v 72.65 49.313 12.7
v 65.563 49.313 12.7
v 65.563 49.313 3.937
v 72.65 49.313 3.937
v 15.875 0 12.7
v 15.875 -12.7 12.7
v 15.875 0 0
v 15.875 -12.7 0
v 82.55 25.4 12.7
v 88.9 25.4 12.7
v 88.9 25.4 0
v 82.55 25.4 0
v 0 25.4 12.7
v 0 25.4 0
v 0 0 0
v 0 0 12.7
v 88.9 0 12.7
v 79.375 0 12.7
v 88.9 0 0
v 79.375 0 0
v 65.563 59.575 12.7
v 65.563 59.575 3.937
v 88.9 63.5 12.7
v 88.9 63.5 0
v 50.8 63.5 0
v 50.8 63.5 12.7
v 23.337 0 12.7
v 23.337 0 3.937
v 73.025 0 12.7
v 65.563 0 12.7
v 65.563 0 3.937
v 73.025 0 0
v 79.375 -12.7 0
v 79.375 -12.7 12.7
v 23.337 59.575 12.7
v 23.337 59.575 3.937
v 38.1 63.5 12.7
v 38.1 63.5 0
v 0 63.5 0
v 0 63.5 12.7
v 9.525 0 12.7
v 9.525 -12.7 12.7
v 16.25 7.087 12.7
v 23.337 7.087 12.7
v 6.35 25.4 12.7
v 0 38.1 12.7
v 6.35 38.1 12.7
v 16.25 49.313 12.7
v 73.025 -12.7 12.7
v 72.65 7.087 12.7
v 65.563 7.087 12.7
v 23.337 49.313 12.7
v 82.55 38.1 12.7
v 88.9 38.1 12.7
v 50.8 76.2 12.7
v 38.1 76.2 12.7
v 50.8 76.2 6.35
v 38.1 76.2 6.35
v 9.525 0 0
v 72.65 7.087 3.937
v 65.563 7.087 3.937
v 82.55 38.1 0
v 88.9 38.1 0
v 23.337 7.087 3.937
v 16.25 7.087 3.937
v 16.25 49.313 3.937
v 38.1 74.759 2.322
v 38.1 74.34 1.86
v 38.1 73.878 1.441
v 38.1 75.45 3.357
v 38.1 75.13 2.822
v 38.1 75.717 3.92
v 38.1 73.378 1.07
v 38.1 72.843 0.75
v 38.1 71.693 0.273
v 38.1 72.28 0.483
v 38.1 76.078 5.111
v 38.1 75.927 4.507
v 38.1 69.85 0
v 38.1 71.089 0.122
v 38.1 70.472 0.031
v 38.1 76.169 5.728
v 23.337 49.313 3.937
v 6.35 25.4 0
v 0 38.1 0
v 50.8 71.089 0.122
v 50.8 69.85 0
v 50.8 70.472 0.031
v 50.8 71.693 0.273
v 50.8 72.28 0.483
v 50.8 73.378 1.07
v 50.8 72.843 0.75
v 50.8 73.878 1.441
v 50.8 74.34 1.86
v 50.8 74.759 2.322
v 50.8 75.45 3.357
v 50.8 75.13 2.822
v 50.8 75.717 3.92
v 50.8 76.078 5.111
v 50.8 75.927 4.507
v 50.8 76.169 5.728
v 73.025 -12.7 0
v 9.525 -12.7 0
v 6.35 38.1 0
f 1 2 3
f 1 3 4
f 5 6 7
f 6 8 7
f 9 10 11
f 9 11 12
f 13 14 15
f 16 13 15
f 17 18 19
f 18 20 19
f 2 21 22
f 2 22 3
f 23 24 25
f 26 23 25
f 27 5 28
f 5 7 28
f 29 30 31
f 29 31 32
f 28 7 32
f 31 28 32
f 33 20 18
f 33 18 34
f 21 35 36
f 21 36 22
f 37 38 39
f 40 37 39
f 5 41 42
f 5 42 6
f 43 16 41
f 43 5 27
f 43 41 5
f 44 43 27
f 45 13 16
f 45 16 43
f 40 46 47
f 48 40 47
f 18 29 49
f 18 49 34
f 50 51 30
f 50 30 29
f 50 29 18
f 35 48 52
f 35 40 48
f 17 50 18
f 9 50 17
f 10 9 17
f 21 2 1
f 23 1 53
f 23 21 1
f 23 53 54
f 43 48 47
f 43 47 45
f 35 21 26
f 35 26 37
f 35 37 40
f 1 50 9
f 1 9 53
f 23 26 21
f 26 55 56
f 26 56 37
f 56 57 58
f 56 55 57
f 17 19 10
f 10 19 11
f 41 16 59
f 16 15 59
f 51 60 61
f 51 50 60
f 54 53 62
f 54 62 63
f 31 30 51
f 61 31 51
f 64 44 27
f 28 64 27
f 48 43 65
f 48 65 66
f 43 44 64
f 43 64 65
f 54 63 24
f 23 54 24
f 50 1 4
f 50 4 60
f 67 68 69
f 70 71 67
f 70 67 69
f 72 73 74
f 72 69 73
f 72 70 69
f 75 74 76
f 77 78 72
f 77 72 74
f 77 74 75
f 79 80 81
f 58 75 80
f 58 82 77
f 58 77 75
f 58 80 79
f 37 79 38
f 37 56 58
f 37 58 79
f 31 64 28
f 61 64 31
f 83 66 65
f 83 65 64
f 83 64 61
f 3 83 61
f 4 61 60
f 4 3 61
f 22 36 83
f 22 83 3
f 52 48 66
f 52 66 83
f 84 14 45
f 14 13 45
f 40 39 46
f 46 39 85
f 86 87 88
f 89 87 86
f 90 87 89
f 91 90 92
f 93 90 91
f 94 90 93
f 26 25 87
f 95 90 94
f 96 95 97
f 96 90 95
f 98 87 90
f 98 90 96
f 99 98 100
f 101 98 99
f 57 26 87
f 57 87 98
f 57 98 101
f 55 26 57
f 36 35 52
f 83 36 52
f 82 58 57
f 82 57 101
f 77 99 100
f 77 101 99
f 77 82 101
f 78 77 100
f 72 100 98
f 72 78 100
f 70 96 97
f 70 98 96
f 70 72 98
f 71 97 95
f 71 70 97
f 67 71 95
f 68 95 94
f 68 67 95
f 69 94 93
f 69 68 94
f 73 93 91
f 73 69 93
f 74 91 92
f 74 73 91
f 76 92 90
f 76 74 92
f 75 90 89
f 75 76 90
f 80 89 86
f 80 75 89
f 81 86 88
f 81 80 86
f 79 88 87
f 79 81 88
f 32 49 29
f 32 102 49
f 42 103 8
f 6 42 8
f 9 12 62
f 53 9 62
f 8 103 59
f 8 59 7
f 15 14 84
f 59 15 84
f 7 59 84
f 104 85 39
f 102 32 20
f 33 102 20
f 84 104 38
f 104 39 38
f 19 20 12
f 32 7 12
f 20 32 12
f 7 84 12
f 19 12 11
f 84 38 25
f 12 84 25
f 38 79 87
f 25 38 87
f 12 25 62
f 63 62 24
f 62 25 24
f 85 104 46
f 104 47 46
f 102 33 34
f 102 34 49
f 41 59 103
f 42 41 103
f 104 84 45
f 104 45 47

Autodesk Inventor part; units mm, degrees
ref_plane "YZ Plane" through (0, 0, 0) normal (1, 0, 0) x (0, 1, 0)
ref_plane "XZ Plane" through (0, 0, 0) normal (0, 1, 0) x (-1, 0, 0)
ref_plane "XY Plane" through (0, 0, 0) normal (0, 0, 1) x (1, 0, 0)
sketch "Sketch1" plane through (0, 0, 0) normal (0, 0, 1) x (1, 0, 0)
  line L0 (0, 0) -> (9.525, 0)
  line L1 (88.9, 0) -> (88.9, 63.5)
  line L2 (88.9, 63.5) -> (0, 63.5)
  line L3 (0, 63.5) -> (0, 0)
  line L4 (79.375, 0) -> (79.375, -12.7)
  line L5 (79.375, -12.7) -> (73.025, -12.7)
  line L6 (73.025, -12.7) -> (73.025, 0)
  line L7 (44.45, 0) -> (44.45, 63.5) construction
  line L8 (16.25, 0) -> (16.25, 56.4) construction
  line L9 (16.25, 56.4) -> (72.65, 56.4) construction
  line L10 (72.65, 56.4) -> (72.65, 0) construction
  line L11 (9.525, 0) -> (9.525, -12.7)
  line L12 (9.525, -12.7) -> (15.875, -12.7)
  line L13 (15.875, -12.7) -> (15.875, 0)
  line L14 (15.875, 0) -> (73.025, 0)
  line L15 (79.375, 0) -> (88.9, 0)
  dimension "d0" = 88.9
  dimension "d1" = 63.5
  dimension "d4" = 6.35
  dimension "d5" = 12.7
ref_plane "Work Plane1" through (0, 0, 12.7) normal (0, 0, 1) x (1, 0, 0)
sketch "Sketch2" plane through (0, 0, 12.7) normal (0, 0, 1) x (1, 0, 0)
  line L0 (23.3366, 59.575) -> (23.3366, 49.3134)
  line L1 (65.5634, 51.3062) -> (65.5634, 49.3134)
  line L2 (65.5634, 59.575) -> (65.5634, 49.3134)
  line L3 (23.3366, 49.3134) -> (23.3366, 56.4)
  line L4 (65.5634, 49.3134) -> (72.65, 49.3134)
  line L5 (72.65, 49.3134) -> (72.65, 7.0866)
  line L6 (72.65, 7.0866) -> (65.5634, 7.0866)
  line L7 (23.3366, 7.0866) -> (23.3366, 0)
  line L8 (23.3366, 0) -> (65.5634, 0)
  line L9 (65.5634, 0) -> (65.5634, 7.0866)
  line L10 (23.3366, 7.0866) -> (16.25, 7.0866)
  line L11 (16.25, 7.0866) -> (16.25, 49.3134)
  line L12 (16.25, 49.3134) -> (23.3366, 49.3134)
  line L13 (44.45, 0) -> (44.45, 56.4) construction
  line L14 (28.575, 0) -> (60.325, 0) construction
  line L15 (44.45, 0) -> (44.45, 63.5) construction
  line L16 (88.9, 63.5) -> (0, 63.5) construction
  line L17 (72.65, 0) -> (16.25, 0) construction
  line L18 (16.25, 0) -> (16.25, 56.4) construction
  line L19 (72.65, 56.4) -> (72.65, 0) construction
  line L20 (23.3366, 59.575) -> (65.5634, 59.575)
  point P0 (0, 0)
  point P1 (72.65, 56.4)
extrude "Extrusion3" add sketch "Sketch1" along normal blind 12.7
extrude "Extrusion5" cut sketch "Sketch2" against normal blind 8.763
sketch "Sketch3" plane through (0, 0, 12.7) normal (0, 0, 1) x (1, 0, 0)
  line L0 (0, 63.5) -> (0, 0) construction
  line L1 (0, 63.5) -> (0, 0) construction
  line L2 (0, 25.4) -> (6.35, 25.4)
  line L3 (6.35, 25.4) -> (6.35, 38.1)
  line L4 (6.35, 38.1) -> (0, 38.1)
  line L5 (0, 38.1) -> (0, 25.4)
  line L6 (88.9, 63.5) -> (0, 63.5) construction
  line L7 (44.45, 63.5) -> (44.45, 0) construction
  line L8 (65.5634, 0) -> (23.3366, 0) construction
  line L9 (88.9, 25.4) -> (82.55, 25.4)
  line L10 (82.55, 25.4) -> (82.55, 38.1)
  line L11 (82.55, 38.1) -> (88.9, 38.1)
  line L12 (88.9, 38.1) -> (88.9, 25.4)
  point P0 (0, 31.75)
  point P1 (88.9, 31.75)
  dimension "d19" = 12.7
extrude "Extrusion6" cut sketch "Sketch3" against normal through all
sketch "Sketch4" plane through (0, 0, 12.7) normal (0, 0, 1) x (1, 0, 0)
  line L0 (88.9, 63.5) -> (0, 63.5) construction
  line L1 (44.45, 63.5) -> (44.45, 69.85) construction
  line L2 (44.45, 63.5) -> (50.8, 63.5) construction
  line L3 (38.1, 63.5) -> (50.8, 63.5)
  line L4 (50.8, 63.5) -> (50.8, 76.2)
  line L5 (50.8, 76.2) -> (38.1, 76.2)
  line L6 (38.1, 76.2) -> (38.1, 63.5)
  line L7 (38.1, 63.5) -> (50.8, 76.2) construction
  line L8 (50.8, 63.5) -> (38.1, 76.2) construction
  point P0 (0, 0)
  dimension "d22" = 6.35
  dimension "d23" = 90
  dimension "d24" = 12.7
  dimension "d25" = 12.7
extrude "Extrusion7" add sketch "Sketch4" against normal blind 12.7
fillet "Fillet1" radius 6.35 1 edges at (44.45, 76.2, 0)
properties part number "Near End Cap" material "PVC-Piping"
